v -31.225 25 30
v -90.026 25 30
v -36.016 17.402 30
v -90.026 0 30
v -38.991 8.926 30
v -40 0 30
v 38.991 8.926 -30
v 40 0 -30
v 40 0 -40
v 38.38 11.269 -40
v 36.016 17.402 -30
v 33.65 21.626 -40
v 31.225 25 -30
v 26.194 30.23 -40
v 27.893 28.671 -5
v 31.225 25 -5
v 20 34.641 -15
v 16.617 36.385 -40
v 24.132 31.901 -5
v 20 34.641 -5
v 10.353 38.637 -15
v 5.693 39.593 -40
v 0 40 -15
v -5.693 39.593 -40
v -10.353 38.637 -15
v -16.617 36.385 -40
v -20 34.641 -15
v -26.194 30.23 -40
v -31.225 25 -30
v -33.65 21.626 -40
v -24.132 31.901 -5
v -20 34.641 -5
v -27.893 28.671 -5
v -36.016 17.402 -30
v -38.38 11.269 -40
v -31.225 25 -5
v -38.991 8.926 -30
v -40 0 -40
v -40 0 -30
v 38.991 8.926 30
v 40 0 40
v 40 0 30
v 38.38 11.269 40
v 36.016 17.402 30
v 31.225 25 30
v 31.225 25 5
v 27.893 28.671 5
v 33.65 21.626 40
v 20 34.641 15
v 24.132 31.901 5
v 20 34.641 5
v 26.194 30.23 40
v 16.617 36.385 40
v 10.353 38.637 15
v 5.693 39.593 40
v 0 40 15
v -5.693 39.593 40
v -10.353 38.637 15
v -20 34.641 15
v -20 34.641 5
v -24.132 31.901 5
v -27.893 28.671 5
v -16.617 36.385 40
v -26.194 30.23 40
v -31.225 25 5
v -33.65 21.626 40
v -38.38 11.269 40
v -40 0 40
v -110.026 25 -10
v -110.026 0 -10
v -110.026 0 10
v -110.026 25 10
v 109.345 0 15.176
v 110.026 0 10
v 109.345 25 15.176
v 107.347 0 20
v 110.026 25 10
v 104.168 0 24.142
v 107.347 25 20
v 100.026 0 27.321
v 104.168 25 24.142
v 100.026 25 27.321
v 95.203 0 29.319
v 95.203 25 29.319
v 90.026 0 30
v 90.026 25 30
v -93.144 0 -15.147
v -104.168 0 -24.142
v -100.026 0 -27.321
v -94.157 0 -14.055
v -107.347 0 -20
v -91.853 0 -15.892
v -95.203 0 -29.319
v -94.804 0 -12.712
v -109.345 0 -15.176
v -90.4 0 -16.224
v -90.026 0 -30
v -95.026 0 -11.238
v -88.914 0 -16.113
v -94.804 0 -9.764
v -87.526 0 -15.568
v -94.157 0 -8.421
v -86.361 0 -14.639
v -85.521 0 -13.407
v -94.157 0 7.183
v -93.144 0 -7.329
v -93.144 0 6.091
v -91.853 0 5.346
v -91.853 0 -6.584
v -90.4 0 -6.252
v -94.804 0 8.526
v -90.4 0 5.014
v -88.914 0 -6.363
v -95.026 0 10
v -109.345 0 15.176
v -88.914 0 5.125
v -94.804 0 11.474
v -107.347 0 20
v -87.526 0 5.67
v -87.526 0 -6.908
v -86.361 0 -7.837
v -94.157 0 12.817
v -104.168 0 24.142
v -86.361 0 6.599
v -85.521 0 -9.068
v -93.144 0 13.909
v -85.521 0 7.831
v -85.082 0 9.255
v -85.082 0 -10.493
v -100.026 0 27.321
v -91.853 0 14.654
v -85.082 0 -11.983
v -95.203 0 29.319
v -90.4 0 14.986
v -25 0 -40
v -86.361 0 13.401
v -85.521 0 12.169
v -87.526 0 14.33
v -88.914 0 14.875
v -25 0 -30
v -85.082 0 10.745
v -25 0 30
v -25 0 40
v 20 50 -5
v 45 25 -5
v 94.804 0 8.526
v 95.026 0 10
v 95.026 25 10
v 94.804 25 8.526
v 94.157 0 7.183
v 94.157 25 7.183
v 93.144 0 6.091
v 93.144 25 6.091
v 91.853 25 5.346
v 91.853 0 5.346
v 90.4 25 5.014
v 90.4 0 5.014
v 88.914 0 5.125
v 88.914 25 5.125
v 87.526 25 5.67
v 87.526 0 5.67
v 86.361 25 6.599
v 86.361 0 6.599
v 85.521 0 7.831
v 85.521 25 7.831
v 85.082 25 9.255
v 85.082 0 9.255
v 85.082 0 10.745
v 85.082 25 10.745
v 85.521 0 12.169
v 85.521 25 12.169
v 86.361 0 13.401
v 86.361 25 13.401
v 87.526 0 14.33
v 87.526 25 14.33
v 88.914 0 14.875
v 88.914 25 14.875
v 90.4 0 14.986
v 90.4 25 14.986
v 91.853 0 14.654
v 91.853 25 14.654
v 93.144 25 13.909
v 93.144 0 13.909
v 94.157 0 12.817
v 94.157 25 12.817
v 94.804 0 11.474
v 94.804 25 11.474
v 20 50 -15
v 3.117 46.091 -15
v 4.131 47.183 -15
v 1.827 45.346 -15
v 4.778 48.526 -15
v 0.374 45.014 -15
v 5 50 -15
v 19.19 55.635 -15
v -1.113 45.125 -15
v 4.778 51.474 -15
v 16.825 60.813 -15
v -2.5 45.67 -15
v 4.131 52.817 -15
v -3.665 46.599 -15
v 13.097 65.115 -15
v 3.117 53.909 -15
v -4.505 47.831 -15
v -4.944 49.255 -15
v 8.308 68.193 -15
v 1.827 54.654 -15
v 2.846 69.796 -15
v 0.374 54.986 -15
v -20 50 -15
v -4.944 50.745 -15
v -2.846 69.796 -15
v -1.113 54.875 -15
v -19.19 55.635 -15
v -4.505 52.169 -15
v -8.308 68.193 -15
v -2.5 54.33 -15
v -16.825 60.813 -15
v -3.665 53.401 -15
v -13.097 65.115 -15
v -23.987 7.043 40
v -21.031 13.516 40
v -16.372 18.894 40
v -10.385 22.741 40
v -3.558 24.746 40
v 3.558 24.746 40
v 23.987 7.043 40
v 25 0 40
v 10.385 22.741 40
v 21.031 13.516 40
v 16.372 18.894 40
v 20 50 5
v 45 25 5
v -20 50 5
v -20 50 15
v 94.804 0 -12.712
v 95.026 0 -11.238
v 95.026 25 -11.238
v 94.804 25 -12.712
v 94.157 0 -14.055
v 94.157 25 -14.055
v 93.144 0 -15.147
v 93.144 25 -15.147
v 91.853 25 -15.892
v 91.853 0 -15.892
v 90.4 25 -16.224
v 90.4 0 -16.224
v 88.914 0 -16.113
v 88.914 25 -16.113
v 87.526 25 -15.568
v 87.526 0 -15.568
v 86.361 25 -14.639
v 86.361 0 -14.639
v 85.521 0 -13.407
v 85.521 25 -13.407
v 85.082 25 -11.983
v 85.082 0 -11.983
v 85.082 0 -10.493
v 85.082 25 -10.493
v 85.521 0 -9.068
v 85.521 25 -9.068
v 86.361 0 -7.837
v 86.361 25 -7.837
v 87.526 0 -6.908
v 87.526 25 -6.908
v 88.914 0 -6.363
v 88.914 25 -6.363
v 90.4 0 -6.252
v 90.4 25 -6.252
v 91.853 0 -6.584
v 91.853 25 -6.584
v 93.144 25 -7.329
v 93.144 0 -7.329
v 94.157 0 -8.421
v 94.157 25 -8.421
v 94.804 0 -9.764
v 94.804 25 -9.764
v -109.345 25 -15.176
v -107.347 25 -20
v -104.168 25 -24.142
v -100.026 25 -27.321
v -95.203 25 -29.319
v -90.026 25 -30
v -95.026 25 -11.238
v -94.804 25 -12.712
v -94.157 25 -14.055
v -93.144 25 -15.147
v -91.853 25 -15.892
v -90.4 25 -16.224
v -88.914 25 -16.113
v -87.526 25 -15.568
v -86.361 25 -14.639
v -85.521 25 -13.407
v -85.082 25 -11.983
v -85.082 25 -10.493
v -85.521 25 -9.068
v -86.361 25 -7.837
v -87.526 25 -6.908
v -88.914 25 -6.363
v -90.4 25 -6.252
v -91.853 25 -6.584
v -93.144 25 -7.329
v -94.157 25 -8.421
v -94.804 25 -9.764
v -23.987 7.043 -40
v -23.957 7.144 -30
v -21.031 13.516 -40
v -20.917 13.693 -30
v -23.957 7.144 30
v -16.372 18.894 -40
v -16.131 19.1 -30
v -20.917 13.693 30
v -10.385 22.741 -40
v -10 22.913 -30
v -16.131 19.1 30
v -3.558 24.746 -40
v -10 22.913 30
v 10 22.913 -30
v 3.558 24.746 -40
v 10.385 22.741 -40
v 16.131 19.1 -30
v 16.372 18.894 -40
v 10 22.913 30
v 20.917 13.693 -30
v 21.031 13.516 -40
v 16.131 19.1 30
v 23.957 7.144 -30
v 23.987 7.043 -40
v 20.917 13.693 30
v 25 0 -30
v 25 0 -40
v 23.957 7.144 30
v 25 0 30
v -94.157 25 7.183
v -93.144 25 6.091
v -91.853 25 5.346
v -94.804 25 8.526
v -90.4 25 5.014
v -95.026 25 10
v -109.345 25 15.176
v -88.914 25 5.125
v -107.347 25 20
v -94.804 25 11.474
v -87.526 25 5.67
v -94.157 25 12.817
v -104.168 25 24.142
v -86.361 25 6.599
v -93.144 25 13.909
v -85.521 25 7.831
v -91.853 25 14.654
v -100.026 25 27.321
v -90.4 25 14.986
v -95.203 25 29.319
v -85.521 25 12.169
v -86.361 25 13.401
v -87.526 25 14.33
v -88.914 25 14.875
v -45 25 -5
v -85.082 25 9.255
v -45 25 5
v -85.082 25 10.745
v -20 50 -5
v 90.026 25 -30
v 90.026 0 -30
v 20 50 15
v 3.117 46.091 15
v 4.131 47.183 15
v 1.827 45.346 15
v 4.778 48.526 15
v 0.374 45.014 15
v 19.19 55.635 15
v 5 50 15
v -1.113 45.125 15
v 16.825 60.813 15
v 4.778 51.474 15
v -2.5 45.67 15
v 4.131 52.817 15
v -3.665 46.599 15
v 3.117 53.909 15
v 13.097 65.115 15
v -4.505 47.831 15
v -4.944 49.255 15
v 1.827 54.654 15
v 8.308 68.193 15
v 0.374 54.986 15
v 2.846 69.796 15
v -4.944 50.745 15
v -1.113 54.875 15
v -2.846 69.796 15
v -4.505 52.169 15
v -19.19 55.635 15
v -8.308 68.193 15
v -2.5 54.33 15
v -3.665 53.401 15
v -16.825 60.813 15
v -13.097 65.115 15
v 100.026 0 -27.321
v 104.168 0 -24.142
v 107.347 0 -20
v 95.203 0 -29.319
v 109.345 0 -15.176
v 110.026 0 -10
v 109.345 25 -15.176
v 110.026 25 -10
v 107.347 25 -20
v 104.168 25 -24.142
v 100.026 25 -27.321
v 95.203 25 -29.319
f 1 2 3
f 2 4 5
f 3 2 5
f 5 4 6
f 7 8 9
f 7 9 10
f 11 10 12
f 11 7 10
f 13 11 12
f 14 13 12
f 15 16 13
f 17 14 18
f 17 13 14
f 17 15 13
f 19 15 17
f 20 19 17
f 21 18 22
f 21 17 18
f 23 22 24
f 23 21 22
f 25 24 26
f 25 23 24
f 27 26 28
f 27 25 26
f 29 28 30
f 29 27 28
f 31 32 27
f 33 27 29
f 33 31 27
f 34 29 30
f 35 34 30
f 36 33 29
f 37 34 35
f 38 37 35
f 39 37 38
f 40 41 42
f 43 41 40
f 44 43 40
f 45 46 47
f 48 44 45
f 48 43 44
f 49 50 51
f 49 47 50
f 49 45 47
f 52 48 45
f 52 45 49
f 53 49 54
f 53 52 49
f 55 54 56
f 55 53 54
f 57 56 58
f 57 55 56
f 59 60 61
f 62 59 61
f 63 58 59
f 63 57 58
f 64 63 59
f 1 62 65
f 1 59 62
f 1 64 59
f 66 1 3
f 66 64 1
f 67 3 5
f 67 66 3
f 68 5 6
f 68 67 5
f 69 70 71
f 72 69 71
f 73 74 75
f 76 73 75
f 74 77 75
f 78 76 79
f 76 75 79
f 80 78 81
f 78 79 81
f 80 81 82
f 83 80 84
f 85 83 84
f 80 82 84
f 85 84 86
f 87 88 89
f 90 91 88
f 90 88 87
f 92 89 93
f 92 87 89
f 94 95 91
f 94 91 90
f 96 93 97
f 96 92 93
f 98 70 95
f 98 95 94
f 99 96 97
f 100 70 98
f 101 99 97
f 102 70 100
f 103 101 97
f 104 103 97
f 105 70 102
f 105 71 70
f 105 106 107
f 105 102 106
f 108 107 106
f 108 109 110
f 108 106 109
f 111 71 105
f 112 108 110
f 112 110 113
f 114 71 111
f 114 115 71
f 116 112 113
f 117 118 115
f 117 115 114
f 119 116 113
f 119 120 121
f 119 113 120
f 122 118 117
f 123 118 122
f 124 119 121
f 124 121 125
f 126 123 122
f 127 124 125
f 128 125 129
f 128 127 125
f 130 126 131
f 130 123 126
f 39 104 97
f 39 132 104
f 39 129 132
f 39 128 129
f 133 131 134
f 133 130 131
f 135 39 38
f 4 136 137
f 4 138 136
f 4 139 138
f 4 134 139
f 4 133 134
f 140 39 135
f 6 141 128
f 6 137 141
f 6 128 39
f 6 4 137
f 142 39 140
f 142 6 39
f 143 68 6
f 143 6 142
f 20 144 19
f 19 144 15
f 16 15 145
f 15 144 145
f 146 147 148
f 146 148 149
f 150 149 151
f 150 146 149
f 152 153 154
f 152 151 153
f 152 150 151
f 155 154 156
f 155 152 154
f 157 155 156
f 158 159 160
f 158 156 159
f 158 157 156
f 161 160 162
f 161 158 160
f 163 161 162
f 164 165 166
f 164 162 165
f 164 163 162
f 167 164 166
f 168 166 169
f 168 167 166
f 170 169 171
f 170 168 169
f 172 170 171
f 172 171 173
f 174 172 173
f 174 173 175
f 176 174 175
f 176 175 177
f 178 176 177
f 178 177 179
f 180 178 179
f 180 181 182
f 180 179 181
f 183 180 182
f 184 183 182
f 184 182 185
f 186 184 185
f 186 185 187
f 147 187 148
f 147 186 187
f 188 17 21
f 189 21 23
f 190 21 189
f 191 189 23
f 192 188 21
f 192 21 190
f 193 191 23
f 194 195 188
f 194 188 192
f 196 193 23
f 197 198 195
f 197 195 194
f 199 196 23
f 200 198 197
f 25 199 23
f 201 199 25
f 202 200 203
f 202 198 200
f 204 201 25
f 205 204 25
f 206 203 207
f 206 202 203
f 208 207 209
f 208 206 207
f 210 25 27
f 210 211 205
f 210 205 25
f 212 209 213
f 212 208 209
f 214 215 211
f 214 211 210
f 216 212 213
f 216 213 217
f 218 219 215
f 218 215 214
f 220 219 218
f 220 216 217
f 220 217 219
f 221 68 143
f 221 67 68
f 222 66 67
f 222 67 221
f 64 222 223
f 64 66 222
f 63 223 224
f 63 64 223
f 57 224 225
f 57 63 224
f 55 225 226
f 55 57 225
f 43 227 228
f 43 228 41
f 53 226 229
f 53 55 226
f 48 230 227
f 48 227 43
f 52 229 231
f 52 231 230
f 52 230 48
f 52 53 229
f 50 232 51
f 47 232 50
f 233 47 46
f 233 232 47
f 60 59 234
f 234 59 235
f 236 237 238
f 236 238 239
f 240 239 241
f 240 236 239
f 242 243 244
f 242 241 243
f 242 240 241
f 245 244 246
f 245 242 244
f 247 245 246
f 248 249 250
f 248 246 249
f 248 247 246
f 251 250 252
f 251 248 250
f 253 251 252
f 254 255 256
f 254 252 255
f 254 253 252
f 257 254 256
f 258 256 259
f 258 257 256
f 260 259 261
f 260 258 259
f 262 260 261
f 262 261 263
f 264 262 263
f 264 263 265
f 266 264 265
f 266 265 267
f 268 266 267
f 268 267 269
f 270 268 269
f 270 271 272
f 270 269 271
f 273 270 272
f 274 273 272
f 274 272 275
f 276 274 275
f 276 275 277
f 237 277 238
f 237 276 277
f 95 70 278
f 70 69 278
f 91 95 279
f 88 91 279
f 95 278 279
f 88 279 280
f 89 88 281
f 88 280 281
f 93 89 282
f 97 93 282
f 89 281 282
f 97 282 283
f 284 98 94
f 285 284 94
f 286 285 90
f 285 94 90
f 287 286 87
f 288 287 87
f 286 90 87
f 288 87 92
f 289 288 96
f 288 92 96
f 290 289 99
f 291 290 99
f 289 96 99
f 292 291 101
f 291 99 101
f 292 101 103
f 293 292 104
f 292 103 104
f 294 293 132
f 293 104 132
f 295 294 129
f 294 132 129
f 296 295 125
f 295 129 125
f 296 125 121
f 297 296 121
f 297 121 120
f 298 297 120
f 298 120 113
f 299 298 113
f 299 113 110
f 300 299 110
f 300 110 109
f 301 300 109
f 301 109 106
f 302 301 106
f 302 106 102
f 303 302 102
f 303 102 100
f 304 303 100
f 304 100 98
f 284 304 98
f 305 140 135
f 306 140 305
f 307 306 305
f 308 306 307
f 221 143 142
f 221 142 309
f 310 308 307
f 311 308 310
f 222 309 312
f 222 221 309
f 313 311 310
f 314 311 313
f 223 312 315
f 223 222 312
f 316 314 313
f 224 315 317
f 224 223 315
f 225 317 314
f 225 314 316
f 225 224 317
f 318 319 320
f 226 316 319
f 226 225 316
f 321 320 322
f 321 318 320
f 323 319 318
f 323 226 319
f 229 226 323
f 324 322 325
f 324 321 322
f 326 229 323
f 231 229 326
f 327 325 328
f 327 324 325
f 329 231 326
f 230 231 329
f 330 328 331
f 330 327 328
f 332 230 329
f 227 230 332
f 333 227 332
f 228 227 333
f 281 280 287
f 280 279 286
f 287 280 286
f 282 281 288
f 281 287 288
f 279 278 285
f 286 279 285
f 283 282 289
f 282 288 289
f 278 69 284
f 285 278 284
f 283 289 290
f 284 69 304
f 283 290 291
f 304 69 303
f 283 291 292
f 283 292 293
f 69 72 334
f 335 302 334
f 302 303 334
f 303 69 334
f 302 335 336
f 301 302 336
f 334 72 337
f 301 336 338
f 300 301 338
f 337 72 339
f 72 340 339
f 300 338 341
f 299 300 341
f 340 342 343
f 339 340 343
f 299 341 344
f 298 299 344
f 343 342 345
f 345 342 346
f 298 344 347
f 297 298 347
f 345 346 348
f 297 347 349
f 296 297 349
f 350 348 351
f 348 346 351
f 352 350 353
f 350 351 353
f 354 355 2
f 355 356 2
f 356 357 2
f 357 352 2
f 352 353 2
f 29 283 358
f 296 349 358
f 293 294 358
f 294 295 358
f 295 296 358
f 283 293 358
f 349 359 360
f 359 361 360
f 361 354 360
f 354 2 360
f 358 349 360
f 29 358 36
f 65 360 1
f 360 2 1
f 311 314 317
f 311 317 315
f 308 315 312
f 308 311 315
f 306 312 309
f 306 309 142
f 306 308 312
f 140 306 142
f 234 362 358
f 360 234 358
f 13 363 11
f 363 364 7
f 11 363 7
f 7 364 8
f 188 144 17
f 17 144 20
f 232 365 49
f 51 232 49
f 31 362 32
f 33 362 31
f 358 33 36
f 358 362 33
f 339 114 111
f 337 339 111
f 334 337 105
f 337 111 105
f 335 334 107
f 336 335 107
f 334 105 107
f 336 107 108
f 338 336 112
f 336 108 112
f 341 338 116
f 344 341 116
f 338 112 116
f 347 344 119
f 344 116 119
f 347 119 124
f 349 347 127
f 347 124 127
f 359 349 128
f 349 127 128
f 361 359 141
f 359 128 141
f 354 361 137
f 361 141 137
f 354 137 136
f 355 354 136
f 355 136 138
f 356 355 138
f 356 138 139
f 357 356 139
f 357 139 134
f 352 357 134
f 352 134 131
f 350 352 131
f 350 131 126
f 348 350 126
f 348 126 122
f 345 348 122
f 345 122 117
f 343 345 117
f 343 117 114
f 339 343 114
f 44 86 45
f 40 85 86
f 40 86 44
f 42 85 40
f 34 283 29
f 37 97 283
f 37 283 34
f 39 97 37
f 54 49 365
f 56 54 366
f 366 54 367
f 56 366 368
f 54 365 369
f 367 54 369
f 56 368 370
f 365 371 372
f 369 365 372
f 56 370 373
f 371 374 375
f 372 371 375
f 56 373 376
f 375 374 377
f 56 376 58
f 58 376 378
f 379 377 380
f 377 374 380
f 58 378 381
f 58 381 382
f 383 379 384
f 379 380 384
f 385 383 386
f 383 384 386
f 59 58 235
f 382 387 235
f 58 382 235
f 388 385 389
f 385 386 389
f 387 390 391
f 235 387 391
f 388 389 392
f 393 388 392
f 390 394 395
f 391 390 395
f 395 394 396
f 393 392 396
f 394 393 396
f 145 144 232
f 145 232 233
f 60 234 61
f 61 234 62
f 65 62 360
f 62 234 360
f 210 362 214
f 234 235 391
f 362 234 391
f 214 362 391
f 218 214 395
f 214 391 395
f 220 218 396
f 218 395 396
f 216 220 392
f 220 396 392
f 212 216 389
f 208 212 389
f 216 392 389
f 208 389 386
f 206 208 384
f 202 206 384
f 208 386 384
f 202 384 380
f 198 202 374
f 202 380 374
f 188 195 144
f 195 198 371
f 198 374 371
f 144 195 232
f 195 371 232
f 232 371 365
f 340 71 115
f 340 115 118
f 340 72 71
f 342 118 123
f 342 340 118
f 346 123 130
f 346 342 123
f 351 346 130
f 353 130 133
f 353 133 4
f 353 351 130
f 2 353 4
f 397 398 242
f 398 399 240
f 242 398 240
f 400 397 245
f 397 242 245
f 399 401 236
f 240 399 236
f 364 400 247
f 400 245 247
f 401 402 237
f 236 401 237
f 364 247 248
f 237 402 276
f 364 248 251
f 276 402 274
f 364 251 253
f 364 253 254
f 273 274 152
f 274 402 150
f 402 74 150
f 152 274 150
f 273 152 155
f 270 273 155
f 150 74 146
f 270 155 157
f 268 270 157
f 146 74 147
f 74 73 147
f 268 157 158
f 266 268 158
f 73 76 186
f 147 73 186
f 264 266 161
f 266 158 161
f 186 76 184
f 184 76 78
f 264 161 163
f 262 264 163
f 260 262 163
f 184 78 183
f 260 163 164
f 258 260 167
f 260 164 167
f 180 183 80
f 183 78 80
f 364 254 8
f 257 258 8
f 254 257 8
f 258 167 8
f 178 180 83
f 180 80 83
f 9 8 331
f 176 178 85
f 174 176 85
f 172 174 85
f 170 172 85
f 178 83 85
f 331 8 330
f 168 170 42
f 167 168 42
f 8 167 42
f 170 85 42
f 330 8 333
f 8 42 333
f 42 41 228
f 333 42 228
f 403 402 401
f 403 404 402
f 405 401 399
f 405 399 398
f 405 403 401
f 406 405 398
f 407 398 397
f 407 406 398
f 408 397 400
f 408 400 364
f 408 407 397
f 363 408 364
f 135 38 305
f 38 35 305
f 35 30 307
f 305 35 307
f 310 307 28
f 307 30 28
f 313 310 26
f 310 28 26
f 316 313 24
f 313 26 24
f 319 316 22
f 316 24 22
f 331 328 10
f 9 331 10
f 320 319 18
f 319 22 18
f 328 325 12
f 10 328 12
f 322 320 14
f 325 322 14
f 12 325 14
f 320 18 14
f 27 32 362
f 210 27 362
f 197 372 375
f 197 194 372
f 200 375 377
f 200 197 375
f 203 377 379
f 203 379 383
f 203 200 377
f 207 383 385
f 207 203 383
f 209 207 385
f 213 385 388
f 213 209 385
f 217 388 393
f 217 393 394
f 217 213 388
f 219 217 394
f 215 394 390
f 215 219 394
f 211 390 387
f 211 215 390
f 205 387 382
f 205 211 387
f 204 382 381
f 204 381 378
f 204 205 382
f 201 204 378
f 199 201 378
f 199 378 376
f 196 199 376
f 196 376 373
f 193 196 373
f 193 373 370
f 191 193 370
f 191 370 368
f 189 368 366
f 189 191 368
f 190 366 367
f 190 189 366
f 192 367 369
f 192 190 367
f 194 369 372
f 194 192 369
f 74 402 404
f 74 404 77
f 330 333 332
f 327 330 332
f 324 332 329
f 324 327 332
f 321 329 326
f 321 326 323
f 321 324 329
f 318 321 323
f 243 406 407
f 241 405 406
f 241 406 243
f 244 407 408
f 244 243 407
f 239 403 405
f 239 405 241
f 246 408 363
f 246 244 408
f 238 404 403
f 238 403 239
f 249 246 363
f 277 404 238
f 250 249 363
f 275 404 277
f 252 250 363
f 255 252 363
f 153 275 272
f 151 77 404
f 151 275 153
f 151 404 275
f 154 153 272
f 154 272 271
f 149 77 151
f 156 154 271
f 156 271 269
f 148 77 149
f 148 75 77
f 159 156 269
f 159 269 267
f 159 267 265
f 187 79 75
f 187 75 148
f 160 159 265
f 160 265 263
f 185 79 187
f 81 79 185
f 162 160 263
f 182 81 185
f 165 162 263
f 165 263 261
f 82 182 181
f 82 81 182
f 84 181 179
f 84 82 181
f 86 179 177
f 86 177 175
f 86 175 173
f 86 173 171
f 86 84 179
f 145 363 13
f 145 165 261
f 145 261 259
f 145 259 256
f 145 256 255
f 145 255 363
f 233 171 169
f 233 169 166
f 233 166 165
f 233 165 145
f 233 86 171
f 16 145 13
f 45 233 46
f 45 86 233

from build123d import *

# Parameters (mm, degrees)
BOSS_EXTRUDE1_DEPTH        = 40
SKETCH3_W                  = 100.026130685
SKETCH3_H                  = 60
BOSS_EXTRUDE2_DEPTH        = 25
FILLET1_R                  = 20
F_10_0_10_DIAMETER_HOLE1_D = 10
FILLET1_OF_MIRROR1_R       = 20
DELETEFACE1_START          = -30
DELETEFACE1_DEPTH          = 60
SKETCH16_R                 = 5
BOSS_EXTRUDE3_DEPTH        = 15
RIB1_REACH                 = 138.403
SKETCH18_WALL_W            = 310.161126634
SKETCH18_WALL_H            = 10


# Read off the part's stored shape, not the designer's step: DeleteFace1
with BuildPart() as part:
    # Sketch2 → Boss-Extrude1 (new, symmetric)
    with BuildSketch(Plane.XY):
        with BuildLine():
            Line((-40, 0), (-25, 0))
            ThreePointArc((-25, 0), (0, 25), (25, 0))
            Line((25, 0), (40, 0))
            ThreePointArc((40, 0), (0, 40), (-40, 0))
        make_face()
    extrude(amount=BOSS_EXTRUDE1_DEPTH, both=True)

    # Sketch3 → Boss-Extrude2 (add)
    with BuildSketch(Plane.XZ):
        with Locations((-60.013065343, 0)):
            Rectangle(SKETCH3_W, SKETCH3_H)
    boss_extrude2 = extrude(amount=-BOSS_EXTRUDE2_DEPTH)

    # Fillet1
    fillet1_edges = [part.edges().sort_by_distance(p)[0] for p in [
        (-110.026130685, 12.5, 30),
        (-110.026130685, 12.5, -30),
    ]]
    fillet(fillet1_edges, radius=FILLET1_R)

    # Ø10.0 (10) Diameter Hole1 (through all)
    with Locations(Plane(origin=(0, 25, 0), x_dir=(1, 0, 0), z_dir=(0, 1, 0))):
        with Locations((-90.026130685, -10), (-90.026130685, 11.237902365)):
            f_10_0_10_diameter_hole1 = Hole(F_10_0_10_DIAMETER_HOLE1_D / 2)

    # Mirror1: Boss-Extrude2, Ø10.0 (10) Diameter Hole1 across plane
    add(boss_extrude2.mirror(Plane(origin=(0, 0, 0), x_dir=(0, 0, 1), z_dir=(1, 0, 0))))
    add(f_10_0_10_diameter_hole1.mirror(Plane(origin=(0, 0, 0), x_dir=(0, 0, 1), z_dir=(1, 0, 0))), mode=Mode.SUBTRACT)

    # Fillet1 of Mirror1
    fillet1_of_mirror1_edges = [part.edges().sort_by_distance(p)[0] for p in [
        (110.026130685, 12.5, 30),
        (110.026130685, 12.5, -30),
    ]]
    fillet(fillet1_of_mirror1_edges, radius=FILLET1_OF_MIRROR1_R)

    # DeleteFace1 outline → DeleteFace1 (cut)
    with BuildSketch(Plane.XY.offset(DELETEFACE1_START)):
        with BuildLine():
            ThreePointArc((25, 0), (20.916500663, 13.693063938), (10, 22.912878475))
            Line((10, 22.912878475), (10, 0))
            Line((10, 0), (25, 0))
        make_face()
        with BuildLine():
            ThreePointArc((-10, 22.912878475), (-20.916500663, 13.693063938), (-25, 0))
            Line((-25, 0), (-10, 0))
            Line((-10, 0), (-10, 22.912878475))
        make_face()
    extrude(amount=DELETEFACE1_DEPTH, mode=Mode.SUBTRACT)

    # Sketch16 → Boss-Extrude3 (add, symmetric)
    with BuildSketch(Plane.XY):
        with BuildLine():
            ThreePointArc((20, 34.641016151), (0, 40), (-20, 34.641016151))
            Line((-20, 34.641016151), (-20, 50))
            ThreePointArc((-20, 50), (0, 70), (20, 50))
            Line((20, 50), (20, 34.641016151))
        make_face()
        with Locations((0, 50)):
            Circle(SKETCH16_R, mode=Mode.SUBTRACT)
    extrude(amount=BOSS_EXTRUDE3_DEPTH, both=True)

    # Sketch18 wall → Rib1 (add, up to next)
    with BuildSketch(Plane(origin=(-32.5, 37.5, 0), x_dir=(-0.707106781187, -0.707106781187, 0), z_dir=(0.707106781187, -0.707106781187, 0)), mode=Mode.PRIVATE) as rib1_sk1:
        Rectangle(SKETCH18_WALL_W, SKETCH18_WALL_H)
    rib1_tool1 = extrude(rib1_sk1.sketch, amount=RIB1_REACH, mode=Mode.PRIVATE) - part.part
    rib1 = rib1_tool1.solids().sort_by_distance((-32.5, 37.5, 0))[0]
    add(rib1)

    # Mirror2: Rib1 across plane
    add(rib1.mirror(Plane(origin=(0, 0, 0), x_dir=(0, 0, 1), z_dir=(1, 0, 0))))


solid = part.part
